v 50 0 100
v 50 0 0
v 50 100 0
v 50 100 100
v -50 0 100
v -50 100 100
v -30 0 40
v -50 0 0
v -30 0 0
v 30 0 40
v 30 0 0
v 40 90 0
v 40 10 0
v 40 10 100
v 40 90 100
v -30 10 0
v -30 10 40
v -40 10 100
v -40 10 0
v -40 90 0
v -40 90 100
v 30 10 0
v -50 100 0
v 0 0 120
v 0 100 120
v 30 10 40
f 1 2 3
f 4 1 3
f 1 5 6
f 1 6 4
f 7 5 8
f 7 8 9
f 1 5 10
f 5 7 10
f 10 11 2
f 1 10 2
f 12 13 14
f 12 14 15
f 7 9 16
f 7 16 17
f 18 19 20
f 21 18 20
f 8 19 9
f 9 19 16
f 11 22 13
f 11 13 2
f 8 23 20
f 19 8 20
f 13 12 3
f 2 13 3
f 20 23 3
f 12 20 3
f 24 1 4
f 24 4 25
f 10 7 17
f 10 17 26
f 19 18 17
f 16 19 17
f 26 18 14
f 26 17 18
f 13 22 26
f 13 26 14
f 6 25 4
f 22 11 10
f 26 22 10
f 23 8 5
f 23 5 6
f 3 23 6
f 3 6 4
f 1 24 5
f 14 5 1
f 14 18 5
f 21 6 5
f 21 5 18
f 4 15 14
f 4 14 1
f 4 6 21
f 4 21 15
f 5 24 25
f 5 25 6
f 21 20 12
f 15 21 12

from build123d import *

# Parameters (mm, degrees)
F0_W     = 100
F0_H     = 100
F0_W_2   = 80
F0_H_2   = 80
F1_DEPTH = 100
F2_W     = 60
F2_H     = 40
F3_DEPTH = 10
F5_DEPTH = 100


with BuildPart() as f1:
    # F0 (on Top) → F1 (new body)
    with BuildSketch(Plane.XY):
        with Locations((0, 50)):
            Rectangle(F0_W, F0_H)
        with Locations((0, 50)):
            Rectangle(F0_W_2, F0_H_2, mode=Mode.SUBTRACT)
    extrude(amount=F1_DEPTH)

    # F2 (on face) → F3 (cut, through all)
    with BuildSketch(Plane.XZ):
        with Locations((0, 20)):
            Rectangle(F2_W, F2_H)
    extrude(amount=-F3_DEPTH, mode=Mode.SUBTRACT)


with BuildPart() as f5:
    # F4 (on face) → F5 (new body, through all)
    with BuildSketch(Plane.XZ):
        Polygon((0, 120), (-50, 100), (50, 100), align=None)
    extrude(amount=-F5_DEPTH)


solid = Compound([f1.part, f5.part])
